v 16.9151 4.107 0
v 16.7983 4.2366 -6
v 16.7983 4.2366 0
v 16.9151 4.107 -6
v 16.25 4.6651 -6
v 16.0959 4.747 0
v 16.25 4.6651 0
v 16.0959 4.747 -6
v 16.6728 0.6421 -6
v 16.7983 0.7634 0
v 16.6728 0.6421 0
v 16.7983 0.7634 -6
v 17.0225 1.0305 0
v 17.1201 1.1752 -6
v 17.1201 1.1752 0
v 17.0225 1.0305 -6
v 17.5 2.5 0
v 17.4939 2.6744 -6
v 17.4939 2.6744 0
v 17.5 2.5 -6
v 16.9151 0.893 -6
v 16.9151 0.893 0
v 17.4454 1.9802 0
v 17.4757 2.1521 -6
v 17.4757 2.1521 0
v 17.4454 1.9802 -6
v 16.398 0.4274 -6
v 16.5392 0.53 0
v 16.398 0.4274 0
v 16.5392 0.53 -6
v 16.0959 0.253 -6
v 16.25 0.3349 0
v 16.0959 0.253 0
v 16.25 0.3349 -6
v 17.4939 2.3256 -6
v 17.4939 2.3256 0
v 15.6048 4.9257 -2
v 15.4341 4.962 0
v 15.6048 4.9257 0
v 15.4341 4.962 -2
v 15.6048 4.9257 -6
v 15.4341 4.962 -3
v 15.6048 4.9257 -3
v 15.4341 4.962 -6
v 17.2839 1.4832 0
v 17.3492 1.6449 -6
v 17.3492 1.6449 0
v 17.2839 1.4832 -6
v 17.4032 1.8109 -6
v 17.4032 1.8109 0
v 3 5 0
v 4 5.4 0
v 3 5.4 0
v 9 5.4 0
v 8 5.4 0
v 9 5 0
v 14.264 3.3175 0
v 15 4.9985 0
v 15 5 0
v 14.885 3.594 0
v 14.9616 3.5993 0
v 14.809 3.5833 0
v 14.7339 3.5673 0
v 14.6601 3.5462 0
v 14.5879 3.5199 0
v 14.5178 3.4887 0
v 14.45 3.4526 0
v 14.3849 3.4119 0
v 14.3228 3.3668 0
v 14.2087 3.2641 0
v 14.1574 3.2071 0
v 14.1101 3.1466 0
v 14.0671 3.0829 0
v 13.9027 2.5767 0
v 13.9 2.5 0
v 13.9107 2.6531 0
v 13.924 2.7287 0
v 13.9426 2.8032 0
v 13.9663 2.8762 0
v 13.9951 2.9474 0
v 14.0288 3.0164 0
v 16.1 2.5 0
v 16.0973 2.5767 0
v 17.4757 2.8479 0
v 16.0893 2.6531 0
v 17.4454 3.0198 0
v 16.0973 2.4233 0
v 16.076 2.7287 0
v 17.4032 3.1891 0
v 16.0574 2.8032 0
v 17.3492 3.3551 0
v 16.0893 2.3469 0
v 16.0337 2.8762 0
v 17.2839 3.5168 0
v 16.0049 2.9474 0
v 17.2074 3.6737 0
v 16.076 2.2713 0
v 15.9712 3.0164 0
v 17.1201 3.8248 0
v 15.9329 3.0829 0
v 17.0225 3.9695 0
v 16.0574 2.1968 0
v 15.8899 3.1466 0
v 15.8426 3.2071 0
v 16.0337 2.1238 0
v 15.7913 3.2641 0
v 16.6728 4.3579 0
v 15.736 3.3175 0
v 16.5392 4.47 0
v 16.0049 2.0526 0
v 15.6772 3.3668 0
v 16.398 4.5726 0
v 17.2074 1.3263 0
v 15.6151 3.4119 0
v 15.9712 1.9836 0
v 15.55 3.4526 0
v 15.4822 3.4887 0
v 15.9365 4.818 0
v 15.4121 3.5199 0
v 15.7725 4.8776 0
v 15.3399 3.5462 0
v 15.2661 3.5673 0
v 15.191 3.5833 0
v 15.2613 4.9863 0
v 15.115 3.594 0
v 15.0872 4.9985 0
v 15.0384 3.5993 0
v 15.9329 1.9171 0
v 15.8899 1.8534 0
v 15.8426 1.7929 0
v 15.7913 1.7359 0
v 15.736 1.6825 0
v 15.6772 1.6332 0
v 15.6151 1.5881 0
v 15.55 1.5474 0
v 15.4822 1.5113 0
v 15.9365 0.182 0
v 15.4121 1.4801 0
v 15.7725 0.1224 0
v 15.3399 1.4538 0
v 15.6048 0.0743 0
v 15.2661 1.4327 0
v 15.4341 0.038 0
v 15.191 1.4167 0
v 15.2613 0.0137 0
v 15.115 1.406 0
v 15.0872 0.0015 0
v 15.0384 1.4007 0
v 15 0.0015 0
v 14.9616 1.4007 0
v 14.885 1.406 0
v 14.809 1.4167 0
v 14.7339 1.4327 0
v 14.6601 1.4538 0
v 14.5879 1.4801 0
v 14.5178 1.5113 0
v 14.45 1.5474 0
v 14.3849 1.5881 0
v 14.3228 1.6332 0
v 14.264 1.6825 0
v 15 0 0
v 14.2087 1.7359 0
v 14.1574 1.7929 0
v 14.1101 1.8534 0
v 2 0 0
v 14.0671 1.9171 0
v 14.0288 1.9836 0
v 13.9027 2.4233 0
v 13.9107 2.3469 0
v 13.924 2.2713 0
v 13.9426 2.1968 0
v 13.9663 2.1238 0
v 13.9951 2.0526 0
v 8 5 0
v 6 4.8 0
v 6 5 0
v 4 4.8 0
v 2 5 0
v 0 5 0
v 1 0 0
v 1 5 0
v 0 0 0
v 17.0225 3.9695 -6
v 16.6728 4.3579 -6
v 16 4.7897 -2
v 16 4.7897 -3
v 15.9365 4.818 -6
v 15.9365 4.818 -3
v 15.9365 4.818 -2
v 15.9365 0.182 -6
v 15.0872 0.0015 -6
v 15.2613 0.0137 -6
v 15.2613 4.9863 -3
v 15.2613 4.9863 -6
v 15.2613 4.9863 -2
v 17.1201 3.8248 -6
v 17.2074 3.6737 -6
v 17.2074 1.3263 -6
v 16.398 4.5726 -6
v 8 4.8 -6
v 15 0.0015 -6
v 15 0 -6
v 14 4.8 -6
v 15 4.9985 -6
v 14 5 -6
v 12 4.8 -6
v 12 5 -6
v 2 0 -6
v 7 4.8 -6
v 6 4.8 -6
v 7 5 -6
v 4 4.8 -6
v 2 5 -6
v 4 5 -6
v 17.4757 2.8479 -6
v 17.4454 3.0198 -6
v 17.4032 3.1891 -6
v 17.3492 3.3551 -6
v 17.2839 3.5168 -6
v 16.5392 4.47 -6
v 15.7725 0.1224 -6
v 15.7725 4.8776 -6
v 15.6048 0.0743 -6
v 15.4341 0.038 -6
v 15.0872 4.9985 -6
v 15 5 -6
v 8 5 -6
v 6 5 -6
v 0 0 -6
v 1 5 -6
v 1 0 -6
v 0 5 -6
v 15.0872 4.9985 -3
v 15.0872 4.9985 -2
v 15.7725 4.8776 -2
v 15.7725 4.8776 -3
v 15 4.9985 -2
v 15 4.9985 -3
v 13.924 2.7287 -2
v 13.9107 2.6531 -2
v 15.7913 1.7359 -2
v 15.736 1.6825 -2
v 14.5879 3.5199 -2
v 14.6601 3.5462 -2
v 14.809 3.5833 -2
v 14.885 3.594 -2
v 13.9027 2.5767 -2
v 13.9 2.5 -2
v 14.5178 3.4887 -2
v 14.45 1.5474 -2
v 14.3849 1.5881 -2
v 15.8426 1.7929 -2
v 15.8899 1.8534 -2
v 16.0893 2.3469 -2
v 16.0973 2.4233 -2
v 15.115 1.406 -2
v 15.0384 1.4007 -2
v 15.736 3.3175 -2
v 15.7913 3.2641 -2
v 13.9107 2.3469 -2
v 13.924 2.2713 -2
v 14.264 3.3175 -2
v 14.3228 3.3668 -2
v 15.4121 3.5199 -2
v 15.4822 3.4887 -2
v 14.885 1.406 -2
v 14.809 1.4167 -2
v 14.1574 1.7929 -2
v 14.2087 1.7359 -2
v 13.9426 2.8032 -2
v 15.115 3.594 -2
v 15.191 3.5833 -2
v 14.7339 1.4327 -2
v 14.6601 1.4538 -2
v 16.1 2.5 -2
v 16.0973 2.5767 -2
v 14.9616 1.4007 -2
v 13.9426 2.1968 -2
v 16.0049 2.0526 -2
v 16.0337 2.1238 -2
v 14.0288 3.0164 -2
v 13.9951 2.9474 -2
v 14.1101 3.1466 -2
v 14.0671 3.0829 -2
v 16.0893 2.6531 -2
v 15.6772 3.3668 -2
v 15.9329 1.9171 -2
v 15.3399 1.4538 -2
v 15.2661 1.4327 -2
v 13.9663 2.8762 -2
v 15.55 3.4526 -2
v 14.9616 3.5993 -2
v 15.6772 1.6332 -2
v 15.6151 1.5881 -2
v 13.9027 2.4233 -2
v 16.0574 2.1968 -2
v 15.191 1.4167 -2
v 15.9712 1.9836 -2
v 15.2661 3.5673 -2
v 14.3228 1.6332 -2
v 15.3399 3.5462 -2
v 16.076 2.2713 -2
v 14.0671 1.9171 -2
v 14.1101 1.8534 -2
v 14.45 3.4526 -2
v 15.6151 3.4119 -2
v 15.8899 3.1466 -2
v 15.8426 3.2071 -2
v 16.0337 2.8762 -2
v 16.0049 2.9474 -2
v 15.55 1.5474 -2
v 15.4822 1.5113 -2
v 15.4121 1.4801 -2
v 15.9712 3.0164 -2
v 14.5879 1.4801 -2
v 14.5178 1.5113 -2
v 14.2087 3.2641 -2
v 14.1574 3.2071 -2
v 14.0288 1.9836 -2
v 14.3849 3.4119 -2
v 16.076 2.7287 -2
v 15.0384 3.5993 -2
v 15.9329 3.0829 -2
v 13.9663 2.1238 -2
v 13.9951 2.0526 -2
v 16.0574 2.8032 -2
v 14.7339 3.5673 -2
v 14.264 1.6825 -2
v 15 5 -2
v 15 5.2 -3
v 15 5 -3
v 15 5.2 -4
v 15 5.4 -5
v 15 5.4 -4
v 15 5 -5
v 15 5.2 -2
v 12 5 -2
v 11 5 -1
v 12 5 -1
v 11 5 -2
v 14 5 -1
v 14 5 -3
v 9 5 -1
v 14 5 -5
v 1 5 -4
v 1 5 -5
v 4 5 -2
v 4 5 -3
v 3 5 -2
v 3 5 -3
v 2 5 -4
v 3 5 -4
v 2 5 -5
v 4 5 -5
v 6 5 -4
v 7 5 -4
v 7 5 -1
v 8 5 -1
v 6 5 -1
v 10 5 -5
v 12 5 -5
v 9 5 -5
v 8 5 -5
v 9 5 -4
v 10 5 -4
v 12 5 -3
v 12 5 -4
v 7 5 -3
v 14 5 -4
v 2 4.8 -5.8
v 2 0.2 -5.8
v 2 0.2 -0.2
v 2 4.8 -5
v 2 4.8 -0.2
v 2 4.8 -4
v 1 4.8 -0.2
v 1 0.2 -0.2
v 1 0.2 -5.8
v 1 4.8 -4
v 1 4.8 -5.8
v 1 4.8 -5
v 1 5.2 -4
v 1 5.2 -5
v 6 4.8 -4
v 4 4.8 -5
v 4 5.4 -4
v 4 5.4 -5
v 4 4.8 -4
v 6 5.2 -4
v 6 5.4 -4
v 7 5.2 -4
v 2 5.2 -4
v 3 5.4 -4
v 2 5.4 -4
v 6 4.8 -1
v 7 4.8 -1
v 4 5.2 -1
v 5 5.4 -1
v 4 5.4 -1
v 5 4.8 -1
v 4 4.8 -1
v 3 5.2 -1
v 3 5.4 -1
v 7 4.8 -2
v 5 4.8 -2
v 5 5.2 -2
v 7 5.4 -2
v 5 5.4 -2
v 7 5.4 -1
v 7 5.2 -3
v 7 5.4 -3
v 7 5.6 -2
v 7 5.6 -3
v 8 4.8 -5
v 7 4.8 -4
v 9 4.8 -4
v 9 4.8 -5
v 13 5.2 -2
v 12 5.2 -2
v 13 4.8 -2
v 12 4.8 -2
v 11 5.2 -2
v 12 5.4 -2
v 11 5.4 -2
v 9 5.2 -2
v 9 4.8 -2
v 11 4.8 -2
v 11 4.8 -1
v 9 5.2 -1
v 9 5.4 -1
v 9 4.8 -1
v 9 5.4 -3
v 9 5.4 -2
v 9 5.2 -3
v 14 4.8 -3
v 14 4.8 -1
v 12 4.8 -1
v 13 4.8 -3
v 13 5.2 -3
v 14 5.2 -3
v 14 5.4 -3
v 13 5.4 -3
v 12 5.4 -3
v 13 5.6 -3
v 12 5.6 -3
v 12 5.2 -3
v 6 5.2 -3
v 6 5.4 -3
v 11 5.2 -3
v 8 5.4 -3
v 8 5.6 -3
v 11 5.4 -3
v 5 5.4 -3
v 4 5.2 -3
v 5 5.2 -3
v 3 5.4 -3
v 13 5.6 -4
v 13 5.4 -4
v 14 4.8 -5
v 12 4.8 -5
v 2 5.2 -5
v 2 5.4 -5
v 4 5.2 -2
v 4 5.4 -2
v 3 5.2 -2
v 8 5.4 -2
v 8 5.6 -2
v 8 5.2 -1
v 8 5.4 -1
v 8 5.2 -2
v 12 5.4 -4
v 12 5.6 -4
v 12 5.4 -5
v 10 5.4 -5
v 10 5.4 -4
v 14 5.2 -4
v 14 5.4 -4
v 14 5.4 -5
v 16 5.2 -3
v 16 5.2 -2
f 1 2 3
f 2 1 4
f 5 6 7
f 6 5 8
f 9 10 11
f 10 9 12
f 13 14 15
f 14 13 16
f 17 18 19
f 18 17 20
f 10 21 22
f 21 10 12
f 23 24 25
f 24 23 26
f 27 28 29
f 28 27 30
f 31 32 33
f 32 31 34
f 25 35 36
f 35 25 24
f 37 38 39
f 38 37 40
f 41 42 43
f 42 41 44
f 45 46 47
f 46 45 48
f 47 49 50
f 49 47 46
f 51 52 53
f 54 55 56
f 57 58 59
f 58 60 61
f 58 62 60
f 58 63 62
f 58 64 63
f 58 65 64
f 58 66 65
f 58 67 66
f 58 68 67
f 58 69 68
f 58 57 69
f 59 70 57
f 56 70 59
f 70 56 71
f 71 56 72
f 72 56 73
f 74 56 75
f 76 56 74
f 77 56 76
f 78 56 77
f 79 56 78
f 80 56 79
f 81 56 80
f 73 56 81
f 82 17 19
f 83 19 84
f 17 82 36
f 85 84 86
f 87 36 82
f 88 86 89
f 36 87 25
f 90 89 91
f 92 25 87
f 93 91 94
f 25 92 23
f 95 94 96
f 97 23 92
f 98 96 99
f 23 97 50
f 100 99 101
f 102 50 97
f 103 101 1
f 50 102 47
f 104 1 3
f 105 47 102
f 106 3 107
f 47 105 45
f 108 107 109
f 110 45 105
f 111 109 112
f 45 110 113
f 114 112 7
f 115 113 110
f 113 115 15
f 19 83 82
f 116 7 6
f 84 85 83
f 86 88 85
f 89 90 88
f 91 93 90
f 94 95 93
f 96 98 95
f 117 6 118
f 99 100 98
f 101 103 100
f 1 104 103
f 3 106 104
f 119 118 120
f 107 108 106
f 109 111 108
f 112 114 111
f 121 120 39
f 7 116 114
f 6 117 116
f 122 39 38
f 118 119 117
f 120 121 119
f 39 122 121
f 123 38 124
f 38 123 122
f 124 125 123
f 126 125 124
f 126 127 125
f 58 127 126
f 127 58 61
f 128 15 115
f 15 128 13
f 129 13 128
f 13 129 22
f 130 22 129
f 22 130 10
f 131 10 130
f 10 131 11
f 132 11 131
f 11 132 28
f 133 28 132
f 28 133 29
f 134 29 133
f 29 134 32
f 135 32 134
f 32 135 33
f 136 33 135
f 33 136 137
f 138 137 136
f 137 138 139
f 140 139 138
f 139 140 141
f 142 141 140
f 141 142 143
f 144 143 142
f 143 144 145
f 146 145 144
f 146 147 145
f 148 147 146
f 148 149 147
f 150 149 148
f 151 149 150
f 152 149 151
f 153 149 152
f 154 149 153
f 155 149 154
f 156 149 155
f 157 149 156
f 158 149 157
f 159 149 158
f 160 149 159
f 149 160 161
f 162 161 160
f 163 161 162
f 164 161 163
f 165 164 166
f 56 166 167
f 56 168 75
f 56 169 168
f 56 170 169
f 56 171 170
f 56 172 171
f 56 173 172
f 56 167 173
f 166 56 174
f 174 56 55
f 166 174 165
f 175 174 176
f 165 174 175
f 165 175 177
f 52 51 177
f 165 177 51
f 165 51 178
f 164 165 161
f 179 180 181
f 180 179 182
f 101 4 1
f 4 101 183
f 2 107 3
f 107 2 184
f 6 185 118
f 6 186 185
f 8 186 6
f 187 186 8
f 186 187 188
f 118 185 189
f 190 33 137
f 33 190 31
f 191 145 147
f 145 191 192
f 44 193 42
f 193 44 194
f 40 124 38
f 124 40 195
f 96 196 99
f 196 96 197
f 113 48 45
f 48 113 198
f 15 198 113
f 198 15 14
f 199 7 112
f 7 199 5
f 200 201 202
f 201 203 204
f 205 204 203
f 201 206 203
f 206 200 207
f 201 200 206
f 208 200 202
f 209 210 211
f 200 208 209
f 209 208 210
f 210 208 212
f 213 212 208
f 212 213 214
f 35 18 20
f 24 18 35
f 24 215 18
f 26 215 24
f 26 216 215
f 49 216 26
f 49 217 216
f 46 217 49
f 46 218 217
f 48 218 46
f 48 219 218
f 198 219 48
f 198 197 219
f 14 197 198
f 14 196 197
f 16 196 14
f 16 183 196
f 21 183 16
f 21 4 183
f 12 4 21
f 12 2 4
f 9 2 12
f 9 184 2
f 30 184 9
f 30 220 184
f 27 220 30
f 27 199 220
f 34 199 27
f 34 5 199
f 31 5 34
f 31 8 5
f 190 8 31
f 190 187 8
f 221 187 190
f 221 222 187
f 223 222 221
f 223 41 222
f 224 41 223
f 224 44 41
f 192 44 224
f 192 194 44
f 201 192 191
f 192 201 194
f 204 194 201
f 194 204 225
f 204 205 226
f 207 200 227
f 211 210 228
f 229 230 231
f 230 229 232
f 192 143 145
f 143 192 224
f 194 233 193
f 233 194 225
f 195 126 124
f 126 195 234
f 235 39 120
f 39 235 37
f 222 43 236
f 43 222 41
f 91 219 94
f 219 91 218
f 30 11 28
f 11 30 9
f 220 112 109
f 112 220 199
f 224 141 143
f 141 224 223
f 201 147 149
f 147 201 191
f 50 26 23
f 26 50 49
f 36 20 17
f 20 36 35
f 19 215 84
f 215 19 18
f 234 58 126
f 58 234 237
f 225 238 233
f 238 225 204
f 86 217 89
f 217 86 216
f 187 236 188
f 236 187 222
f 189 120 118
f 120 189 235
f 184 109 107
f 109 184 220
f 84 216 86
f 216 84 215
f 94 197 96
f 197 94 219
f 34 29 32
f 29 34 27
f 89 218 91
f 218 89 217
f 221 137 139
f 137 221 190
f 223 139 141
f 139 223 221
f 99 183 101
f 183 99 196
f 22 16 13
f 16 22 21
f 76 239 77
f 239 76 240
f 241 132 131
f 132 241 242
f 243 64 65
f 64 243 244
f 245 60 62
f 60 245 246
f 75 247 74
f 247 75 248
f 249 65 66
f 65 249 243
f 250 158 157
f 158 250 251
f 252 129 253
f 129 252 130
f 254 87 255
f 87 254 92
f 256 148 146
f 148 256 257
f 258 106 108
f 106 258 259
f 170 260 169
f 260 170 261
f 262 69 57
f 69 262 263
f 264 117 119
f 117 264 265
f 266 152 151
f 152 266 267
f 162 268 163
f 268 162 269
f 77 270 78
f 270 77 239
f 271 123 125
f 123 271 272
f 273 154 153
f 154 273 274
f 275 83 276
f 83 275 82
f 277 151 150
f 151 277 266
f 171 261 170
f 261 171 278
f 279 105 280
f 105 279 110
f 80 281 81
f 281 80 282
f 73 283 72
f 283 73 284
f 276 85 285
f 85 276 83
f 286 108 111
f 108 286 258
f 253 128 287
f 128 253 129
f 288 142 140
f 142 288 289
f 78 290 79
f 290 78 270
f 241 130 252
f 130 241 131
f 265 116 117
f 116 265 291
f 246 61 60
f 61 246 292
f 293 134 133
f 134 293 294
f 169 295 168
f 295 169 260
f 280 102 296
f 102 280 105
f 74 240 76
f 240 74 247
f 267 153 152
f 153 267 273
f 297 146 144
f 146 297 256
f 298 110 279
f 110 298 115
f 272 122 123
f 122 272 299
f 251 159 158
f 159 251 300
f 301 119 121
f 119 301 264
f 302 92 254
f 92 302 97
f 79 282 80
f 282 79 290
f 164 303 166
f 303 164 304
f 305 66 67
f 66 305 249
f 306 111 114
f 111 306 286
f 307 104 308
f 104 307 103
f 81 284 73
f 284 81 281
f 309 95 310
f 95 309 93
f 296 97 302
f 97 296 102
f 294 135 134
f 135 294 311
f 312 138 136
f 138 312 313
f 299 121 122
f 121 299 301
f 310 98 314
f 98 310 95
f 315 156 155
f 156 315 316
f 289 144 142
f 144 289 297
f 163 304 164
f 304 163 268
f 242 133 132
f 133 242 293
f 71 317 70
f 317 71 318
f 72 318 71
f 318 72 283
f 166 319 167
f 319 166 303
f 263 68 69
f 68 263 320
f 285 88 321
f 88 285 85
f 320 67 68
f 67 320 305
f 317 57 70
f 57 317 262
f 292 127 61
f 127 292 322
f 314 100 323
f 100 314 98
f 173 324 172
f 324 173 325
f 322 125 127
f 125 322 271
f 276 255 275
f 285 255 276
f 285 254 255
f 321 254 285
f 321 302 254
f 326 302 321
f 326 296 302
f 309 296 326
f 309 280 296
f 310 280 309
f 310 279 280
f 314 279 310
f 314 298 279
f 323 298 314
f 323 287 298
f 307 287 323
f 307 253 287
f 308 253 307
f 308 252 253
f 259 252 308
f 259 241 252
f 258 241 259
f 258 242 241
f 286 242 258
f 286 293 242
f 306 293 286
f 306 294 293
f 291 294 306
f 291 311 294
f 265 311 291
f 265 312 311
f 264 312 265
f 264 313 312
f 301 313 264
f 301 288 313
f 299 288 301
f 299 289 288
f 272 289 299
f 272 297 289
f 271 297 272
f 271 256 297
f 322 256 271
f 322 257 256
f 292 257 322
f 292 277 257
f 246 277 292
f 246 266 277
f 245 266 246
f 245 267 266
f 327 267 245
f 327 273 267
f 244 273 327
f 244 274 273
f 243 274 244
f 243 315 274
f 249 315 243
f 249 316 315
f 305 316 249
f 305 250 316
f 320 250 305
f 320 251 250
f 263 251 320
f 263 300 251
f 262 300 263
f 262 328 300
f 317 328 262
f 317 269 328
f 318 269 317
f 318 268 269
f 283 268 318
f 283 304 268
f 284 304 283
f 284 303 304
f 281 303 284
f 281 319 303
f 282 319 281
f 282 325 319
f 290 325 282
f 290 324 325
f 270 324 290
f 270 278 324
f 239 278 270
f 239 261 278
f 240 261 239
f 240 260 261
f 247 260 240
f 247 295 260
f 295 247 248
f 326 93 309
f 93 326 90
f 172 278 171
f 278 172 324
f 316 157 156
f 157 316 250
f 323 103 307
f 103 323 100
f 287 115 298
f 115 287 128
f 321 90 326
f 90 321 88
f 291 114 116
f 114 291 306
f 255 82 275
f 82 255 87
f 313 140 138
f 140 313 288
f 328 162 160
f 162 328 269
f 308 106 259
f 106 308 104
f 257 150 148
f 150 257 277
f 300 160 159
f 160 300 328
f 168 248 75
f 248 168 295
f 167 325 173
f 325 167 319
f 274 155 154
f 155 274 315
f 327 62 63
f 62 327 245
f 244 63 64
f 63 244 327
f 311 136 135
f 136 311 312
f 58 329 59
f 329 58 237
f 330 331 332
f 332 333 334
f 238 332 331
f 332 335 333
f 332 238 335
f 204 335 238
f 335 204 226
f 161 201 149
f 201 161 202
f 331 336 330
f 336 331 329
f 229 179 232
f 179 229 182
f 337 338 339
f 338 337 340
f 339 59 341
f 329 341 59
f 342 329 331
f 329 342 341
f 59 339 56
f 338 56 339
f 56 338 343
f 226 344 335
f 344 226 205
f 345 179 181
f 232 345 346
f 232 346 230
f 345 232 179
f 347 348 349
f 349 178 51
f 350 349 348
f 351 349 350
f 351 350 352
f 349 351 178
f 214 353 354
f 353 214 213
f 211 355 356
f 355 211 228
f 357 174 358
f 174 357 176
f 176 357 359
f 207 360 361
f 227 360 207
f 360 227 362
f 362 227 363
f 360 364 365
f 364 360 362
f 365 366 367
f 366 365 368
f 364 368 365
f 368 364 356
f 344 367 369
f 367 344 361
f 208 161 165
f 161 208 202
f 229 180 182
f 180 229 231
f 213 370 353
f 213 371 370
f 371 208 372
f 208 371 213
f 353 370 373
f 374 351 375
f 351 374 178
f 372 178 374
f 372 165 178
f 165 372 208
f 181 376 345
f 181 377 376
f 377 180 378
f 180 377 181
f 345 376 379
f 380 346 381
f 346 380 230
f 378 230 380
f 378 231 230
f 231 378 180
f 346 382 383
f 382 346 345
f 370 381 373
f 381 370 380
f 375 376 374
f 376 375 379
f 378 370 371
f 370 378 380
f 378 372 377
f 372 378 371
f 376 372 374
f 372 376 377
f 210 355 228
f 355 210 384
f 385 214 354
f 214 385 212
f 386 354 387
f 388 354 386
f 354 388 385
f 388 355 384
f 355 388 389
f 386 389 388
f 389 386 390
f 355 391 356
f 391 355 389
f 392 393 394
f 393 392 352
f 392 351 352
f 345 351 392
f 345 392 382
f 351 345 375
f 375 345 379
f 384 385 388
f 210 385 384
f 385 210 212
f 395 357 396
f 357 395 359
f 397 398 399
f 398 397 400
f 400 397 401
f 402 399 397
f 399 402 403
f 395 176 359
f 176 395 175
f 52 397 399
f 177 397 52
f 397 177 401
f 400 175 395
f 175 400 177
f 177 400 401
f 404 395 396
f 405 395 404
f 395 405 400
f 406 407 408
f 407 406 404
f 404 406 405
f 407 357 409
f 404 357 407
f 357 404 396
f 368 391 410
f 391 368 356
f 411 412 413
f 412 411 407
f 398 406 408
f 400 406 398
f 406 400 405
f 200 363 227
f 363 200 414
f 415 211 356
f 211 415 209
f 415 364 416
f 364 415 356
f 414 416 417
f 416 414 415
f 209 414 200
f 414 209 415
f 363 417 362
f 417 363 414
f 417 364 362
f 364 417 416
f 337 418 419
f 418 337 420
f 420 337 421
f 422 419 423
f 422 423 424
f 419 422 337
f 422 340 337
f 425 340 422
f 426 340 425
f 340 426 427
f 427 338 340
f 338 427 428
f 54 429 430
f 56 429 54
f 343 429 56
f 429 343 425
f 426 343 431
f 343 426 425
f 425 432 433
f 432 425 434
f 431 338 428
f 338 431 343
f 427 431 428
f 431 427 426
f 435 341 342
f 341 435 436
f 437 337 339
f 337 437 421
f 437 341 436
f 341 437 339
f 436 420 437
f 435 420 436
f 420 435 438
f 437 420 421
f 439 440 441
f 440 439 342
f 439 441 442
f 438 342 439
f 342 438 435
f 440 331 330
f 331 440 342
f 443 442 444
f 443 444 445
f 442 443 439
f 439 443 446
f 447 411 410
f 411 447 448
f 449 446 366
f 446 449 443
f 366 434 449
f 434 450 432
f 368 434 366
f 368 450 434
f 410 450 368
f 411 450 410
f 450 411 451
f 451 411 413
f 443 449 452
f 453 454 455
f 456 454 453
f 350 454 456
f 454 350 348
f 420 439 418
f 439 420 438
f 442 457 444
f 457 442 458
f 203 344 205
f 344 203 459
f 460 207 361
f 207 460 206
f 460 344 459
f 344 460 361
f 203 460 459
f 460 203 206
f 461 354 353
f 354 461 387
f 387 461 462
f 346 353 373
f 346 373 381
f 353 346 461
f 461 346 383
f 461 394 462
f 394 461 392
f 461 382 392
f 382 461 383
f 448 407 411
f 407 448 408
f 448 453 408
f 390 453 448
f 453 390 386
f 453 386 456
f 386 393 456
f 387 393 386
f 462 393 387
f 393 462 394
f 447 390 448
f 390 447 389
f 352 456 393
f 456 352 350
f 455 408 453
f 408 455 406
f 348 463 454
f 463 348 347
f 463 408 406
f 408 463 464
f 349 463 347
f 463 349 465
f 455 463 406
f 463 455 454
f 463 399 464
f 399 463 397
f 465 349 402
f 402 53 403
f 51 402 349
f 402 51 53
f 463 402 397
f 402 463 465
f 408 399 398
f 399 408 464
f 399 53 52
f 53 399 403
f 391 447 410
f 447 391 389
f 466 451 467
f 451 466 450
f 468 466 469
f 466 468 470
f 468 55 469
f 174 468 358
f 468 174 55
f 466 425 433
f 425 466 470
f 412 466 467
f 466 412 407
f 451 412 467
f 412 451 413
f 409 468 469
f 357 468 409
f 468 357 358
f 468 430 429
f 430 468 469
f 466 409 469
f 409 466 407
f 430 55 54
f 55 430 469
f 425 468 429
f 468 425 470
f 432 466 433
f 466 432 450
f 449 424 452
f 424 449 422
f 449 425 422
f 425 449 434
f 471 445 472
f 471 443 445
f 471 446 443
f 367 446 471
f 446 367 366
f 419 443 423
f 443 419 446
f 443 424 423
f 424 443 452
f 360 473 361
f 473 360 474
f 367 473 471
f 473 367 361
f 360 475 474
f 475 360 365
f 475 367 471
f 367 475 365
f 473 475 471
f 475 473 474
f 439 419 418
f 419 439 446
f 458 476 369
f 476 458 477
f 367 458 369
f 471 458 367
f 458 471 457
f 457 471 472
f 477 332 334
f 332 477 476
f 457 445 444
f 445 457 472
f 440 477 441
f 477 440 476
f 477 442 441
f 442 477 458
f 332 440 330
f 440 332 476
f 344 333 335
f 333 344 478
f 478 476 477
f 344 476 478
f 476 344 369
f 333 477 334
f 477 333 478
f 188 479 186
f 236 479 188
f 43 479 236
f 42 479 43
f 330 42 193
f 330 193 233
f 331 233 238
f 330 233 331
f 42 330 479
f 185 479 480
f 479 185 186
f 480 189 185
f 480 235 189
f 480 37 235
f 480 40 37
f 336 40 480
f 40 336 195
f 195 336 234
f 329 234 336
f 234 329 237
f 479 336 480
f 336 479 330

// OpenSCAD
//left leg

$fn=90;

rotate([0,90,0]){

difference(){

rotate([0,90,0]){
translate([-15,2.5,0]){
color("darkgrey"){
cylinder(r=2.5,h=6);
}
}
}

translate([-1,2.5,15]){
rotate([0,90,0]){
cylinder(r=1.1,h=3);
}
}

}

difference(){

color("darkgrey"){
cube([6,5,15]);
}

translate([-1,2.5,15]){
rotate([0,90,0]){
cylinder(r=1.1,h=3);
}
}

translate([0,4.8,1]){
color("tan"){
cube([6,1,1]);
}
}

translate([5.8,0,1]){
color("tan"){
cube([1,5,1]);
}
}

translate([0,-0.8,1]){
color("tan"){
cube([6,1,1]);
}
}

translate([-0.8,0,1]){
color("tan"){
cube([1,5,1]);
}
}

translate([4,4.8,4]){
color("tan"){
cube([2,1,2]);
}
}

translate([0,4.8,4]){
color("tan"){
cube([1,1,2]);
}
}

translate([1,4.8,5]){
color("tan"){
cube([1,1,2]);
}
}

translate([4,4.8,7]){
color("tan"){
cube([2,1,1]);
}
}

translate([4,4.8,8]){
color("tan"){
cube([1,1,1]);
}
}

translate([1,4.8,9]){
color("tan"){
cube([1,1,2]);
}
}

translate([1,4.8,12]){
color("tan"){
cube([1,1,2]);
}
}

translate([2,4.8,13]){
color("tan"){
cube([1,1,1]);
}
}

translate([5,4.8,12]){
color("tan"){
cube([1,1,2]);
}
}

}//end of diff

//vines front

translate([4,4.2,1]){
color("darkgreen"){
cube([1,1,1]);
}
}

translate([4,4.4,2]){
color("green"){
cube([1,1,2]);
}
}

translate([3,4.4,3]){
color("green"){
cube([1,1,3]);
}
}

translate([2,4.4,5]){
color("green"){
cube([1,1,2]);
}
}

translate([2,4.2,4]){
color("darkgreen"){
cube([1,1,1]);
}
}

translate([1,4.2,3]){
color("darkgreen"){
cube([1,1,1]);
}
}

translate([1,4.4,4]){
color("green"){
cube([1,1,1]);
}
}

translate([0,4.4,3]){
color("green"){
cube([1,1,1]);
}
}

translate([3,4.2,6]){
color("darkgreen"){
cube([1,1,1]);
}
}

translate([2,4.6,7]){
color("yellow"){
cube([1,1,1]);
}
}

translate([1,4.4,7]){
color("green"){
cube([1,1,1]);
}
}

translate([0,5,8]){
color("green"){
cube([1,0.4,1]);
}
}

translate([1,4.2,8]){
color("darkgreen"){
cube([1,1,1]);
}
}

translate([2,4.4,8]){
color("green"){
cube([1,1,1]);
}
}

translate([2,4.2,9]){
color("darkgreen"){
cube([1,1,2]);
}
}

translate([2,4.4,11]){
color("green"){
cube([1,1,1]);
}
}

translate([4,4.4,10]){
color("green"){
cube([1,1,2]);
}
}

translate([2,4.2,12]){
color("darkgreen"){
cube([1,1,1]);
}
}

translate([3,4.6,12]){
color("yellow"){
cube([1,1,1]);
}
}

translate([3,4.4,13]){
color("green"){
cube([1,1,1]);
}
}

translate([3,4.2,14]){
color("darkgreen"){
cube([1,1,1]);
}
}

translate([4,4.4,14]){
color("green"){
cube([1,1,1]);
}
}

translate([2,4.2,15]){
color("darkgreen"){
cube([1,1,1]);
}
}

}
